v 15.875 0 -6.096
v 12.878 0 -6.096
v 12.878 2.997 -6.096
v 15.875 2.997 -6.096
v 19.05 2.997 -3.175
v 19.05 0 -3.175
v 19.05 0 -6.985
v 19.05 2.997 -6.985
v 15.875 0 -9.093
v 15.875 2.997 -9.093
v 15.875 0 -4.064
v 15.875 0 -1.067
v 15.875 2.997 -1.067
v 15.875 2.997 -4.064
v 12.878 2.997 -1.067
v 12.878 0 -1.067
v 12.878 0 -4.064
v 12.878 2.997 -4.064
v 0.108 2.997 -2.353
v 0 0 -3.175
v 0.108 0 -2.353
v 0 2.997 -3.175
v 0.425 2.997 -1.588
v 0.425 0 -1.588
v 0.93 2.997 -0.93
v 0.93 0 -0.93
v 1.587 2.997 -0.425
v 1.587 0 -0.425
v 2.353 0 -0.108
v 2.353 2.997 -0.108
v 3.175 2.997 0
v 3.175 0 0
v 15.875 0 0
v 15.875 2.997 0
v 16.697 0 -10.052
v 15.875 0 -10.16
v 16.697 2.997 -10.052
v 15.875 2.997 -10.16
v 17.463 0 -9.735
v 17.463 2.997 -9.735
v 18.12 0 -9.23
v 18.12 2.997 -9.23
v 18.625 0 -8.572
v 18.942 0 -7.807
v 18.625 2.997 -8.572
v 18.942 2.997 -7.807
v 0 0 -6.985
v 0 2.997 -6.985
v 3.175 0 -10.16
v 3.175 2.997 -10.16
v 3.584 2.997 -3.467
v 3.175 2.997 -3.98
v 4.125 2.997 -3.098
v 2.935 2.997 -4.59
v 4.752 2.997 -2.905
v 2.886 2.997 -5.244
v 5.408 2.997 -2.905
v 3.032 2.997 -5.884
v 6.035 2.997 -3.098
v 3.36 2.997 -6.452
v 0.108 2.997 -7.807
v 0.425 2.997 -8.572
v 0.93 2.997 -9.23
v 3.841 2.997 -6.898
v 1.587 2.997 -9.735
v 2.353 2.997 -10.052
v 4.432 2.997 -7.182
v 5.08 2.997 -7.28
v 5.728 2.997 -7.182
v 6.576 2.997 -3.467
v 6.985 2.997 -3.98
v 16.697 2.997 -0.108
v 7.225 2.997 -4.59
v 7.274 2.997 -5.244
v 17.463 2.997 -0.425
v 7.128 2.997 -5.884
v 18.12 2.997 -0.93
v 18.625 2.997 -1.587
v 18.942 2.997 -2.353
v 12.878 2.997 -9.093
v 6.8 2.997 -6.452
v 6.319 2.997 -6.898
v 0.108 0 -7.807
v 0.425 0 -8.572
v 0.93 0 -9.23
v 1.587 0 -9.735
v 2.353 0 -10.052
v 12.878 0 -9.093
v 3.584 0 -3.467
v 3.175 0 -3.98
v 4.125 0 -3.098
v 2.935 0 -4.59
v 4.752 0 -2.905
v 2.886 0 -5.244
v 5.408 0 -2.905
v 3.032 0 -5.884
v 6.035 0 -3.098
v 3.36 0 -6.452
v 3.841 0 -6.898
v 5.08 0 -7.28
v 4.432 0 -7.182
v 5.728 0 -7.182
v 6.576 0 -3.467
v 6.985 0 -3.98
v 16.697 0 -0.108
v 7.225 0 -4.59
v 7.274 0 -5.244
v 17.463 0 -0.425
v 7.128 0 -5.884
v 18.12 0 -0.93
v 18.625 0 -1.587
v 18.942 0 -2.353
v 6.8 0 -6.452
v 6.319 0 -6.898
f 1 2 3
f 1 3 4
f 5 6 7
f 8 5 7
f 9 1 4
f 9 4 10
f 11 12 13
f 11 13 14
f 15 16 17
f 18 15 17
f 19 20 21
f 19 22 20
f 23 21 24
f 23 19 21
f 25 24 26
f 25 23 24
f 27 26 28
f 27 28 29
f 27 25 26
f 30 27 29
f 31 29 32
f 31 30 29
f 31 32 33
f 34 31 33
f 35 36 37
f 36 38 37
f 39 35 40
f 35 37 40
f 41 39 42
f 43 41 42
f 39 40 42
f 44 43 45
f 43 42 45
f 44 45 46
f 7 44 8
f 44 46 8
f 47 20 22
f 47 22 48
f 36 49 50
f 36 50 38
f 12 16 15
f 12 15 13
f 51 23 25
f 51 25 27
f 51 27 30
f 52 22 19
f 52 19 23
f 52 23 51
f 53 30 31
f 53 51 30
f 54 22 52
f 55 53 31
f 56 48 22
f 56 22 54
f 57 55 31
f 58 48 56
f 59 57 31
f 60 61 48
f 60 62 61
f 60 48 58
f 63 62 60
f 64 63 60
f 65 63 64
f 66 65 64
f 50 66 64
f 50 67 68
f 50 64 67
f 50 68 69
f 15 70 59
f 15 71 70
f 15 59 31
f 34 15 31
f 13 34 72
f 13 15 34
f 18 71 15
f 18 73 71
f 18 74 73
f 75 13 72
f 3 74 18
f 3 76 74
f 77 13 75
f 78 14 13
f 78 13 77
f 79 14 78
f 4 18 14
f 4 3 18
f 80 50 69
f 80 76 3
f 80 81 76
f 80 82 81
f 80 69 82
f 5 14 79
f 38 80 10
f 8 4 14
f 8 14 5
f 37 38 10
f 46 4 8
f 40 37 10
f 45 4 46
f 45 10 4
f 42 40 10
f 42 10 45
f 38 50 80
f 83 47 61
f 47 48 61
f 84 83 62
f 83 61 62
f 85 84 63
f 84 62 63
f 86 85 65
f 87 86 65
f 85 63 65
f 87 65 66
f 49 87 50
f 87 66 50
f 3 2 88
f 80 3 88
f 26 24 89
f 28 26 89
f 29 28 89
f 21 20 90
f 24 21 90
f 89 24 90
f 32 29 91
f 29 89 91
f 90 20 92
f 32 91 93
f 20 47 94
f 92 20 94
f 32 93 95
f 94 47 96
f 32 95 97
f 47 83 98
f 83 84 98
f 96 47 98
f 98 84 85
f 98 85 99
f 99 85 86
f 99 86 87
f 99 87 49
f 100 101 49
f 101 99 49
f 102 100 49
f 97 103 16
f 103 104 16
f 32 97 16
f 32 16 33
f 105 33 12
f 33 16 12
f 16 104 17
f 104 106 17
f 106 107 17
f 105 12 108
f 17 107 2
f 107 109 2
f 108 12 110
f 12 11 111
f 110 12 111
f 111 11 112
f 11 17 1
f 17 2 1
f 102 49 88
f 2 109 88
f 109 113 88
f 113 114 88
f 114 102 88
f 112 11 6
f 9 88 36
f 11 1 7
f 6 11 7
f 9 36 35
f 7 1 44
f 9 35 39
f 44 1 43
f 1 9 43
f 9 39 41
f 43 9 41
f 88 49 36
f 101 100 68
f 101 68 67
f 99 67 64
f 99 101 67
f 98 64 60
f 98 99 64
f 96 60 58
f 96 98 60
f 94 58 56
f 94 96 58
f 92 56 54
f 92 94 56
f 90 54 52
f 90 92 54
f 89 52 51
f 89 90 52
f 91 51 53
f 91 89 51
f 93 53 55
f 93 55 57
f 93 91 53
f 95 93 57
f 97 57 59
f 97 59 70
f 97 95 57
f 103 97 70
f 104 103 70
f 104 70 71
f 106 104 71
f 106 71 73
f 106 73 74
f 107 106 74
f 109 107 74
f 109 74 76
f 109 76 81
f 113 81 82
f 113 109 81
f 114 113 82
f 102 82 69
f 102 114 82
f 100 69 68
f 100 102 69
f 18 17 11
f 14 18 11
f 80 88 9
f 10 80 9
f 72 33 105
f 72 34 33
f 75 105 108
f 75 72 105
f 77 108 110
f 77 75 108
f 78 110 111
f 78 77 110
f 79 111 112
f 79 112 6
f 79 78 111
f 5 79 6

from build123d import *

# Parameters (mm, degrees)
SKETCH1_W           = 19.05
SKETCH1_H           = 10.16
SKETCH1_R           = 2.2
SKETCH1_W_2         = 2.9972
SKETCH1_H_2         = 2.9972
BOSS_EXTRUDE1_DEPTH = 2.9972
FILLET1_R           = 3.175


with BuildPart() as part:
    # Sketch1 → Boss-Extrude1 (new body)
    with BuildSketch(Plane(origin=(0, 0, 0), x_dir=(1, 0, 0), z_dir=(0, 1, 0))):
        with Locations((9.525, 5.08)):
            Rectangle(SKETCH1_W, SKETCH1_H)
        with Locations(Location((5.08, 5.08, 0), (0, 0, 90))):
            Circle(SKETCH1_R, mode=Mode.SUBTRACT)
        with Locations((14.3764, 2.5654)):
            Rectangle(SKETCH1_W_2, SKETCH1_H_2, mode=Mode.SUBTRACT)
        with Locations((14.3764, 7.5946)):
            Rectangle(SKETCH1_W_2, SKETCH1_H_2, mode=Mode.SUBTRACT)
    extrude(amount=BOSS_EXTRUDE1_DEPTH)

    # Fillet1
    fillet1_edges = [part.edges().sort_by_distance(p)[0] for p in [
        (0, 1.4986, -10.16),
        (19.05, 1.4986, -10.16),
        (19.05, 1.4986, 0),
        (0, 1.4986, 0),
    ]]
    fillet(fillet1_edges, radius=FILLET1_R)


solid = part.part
